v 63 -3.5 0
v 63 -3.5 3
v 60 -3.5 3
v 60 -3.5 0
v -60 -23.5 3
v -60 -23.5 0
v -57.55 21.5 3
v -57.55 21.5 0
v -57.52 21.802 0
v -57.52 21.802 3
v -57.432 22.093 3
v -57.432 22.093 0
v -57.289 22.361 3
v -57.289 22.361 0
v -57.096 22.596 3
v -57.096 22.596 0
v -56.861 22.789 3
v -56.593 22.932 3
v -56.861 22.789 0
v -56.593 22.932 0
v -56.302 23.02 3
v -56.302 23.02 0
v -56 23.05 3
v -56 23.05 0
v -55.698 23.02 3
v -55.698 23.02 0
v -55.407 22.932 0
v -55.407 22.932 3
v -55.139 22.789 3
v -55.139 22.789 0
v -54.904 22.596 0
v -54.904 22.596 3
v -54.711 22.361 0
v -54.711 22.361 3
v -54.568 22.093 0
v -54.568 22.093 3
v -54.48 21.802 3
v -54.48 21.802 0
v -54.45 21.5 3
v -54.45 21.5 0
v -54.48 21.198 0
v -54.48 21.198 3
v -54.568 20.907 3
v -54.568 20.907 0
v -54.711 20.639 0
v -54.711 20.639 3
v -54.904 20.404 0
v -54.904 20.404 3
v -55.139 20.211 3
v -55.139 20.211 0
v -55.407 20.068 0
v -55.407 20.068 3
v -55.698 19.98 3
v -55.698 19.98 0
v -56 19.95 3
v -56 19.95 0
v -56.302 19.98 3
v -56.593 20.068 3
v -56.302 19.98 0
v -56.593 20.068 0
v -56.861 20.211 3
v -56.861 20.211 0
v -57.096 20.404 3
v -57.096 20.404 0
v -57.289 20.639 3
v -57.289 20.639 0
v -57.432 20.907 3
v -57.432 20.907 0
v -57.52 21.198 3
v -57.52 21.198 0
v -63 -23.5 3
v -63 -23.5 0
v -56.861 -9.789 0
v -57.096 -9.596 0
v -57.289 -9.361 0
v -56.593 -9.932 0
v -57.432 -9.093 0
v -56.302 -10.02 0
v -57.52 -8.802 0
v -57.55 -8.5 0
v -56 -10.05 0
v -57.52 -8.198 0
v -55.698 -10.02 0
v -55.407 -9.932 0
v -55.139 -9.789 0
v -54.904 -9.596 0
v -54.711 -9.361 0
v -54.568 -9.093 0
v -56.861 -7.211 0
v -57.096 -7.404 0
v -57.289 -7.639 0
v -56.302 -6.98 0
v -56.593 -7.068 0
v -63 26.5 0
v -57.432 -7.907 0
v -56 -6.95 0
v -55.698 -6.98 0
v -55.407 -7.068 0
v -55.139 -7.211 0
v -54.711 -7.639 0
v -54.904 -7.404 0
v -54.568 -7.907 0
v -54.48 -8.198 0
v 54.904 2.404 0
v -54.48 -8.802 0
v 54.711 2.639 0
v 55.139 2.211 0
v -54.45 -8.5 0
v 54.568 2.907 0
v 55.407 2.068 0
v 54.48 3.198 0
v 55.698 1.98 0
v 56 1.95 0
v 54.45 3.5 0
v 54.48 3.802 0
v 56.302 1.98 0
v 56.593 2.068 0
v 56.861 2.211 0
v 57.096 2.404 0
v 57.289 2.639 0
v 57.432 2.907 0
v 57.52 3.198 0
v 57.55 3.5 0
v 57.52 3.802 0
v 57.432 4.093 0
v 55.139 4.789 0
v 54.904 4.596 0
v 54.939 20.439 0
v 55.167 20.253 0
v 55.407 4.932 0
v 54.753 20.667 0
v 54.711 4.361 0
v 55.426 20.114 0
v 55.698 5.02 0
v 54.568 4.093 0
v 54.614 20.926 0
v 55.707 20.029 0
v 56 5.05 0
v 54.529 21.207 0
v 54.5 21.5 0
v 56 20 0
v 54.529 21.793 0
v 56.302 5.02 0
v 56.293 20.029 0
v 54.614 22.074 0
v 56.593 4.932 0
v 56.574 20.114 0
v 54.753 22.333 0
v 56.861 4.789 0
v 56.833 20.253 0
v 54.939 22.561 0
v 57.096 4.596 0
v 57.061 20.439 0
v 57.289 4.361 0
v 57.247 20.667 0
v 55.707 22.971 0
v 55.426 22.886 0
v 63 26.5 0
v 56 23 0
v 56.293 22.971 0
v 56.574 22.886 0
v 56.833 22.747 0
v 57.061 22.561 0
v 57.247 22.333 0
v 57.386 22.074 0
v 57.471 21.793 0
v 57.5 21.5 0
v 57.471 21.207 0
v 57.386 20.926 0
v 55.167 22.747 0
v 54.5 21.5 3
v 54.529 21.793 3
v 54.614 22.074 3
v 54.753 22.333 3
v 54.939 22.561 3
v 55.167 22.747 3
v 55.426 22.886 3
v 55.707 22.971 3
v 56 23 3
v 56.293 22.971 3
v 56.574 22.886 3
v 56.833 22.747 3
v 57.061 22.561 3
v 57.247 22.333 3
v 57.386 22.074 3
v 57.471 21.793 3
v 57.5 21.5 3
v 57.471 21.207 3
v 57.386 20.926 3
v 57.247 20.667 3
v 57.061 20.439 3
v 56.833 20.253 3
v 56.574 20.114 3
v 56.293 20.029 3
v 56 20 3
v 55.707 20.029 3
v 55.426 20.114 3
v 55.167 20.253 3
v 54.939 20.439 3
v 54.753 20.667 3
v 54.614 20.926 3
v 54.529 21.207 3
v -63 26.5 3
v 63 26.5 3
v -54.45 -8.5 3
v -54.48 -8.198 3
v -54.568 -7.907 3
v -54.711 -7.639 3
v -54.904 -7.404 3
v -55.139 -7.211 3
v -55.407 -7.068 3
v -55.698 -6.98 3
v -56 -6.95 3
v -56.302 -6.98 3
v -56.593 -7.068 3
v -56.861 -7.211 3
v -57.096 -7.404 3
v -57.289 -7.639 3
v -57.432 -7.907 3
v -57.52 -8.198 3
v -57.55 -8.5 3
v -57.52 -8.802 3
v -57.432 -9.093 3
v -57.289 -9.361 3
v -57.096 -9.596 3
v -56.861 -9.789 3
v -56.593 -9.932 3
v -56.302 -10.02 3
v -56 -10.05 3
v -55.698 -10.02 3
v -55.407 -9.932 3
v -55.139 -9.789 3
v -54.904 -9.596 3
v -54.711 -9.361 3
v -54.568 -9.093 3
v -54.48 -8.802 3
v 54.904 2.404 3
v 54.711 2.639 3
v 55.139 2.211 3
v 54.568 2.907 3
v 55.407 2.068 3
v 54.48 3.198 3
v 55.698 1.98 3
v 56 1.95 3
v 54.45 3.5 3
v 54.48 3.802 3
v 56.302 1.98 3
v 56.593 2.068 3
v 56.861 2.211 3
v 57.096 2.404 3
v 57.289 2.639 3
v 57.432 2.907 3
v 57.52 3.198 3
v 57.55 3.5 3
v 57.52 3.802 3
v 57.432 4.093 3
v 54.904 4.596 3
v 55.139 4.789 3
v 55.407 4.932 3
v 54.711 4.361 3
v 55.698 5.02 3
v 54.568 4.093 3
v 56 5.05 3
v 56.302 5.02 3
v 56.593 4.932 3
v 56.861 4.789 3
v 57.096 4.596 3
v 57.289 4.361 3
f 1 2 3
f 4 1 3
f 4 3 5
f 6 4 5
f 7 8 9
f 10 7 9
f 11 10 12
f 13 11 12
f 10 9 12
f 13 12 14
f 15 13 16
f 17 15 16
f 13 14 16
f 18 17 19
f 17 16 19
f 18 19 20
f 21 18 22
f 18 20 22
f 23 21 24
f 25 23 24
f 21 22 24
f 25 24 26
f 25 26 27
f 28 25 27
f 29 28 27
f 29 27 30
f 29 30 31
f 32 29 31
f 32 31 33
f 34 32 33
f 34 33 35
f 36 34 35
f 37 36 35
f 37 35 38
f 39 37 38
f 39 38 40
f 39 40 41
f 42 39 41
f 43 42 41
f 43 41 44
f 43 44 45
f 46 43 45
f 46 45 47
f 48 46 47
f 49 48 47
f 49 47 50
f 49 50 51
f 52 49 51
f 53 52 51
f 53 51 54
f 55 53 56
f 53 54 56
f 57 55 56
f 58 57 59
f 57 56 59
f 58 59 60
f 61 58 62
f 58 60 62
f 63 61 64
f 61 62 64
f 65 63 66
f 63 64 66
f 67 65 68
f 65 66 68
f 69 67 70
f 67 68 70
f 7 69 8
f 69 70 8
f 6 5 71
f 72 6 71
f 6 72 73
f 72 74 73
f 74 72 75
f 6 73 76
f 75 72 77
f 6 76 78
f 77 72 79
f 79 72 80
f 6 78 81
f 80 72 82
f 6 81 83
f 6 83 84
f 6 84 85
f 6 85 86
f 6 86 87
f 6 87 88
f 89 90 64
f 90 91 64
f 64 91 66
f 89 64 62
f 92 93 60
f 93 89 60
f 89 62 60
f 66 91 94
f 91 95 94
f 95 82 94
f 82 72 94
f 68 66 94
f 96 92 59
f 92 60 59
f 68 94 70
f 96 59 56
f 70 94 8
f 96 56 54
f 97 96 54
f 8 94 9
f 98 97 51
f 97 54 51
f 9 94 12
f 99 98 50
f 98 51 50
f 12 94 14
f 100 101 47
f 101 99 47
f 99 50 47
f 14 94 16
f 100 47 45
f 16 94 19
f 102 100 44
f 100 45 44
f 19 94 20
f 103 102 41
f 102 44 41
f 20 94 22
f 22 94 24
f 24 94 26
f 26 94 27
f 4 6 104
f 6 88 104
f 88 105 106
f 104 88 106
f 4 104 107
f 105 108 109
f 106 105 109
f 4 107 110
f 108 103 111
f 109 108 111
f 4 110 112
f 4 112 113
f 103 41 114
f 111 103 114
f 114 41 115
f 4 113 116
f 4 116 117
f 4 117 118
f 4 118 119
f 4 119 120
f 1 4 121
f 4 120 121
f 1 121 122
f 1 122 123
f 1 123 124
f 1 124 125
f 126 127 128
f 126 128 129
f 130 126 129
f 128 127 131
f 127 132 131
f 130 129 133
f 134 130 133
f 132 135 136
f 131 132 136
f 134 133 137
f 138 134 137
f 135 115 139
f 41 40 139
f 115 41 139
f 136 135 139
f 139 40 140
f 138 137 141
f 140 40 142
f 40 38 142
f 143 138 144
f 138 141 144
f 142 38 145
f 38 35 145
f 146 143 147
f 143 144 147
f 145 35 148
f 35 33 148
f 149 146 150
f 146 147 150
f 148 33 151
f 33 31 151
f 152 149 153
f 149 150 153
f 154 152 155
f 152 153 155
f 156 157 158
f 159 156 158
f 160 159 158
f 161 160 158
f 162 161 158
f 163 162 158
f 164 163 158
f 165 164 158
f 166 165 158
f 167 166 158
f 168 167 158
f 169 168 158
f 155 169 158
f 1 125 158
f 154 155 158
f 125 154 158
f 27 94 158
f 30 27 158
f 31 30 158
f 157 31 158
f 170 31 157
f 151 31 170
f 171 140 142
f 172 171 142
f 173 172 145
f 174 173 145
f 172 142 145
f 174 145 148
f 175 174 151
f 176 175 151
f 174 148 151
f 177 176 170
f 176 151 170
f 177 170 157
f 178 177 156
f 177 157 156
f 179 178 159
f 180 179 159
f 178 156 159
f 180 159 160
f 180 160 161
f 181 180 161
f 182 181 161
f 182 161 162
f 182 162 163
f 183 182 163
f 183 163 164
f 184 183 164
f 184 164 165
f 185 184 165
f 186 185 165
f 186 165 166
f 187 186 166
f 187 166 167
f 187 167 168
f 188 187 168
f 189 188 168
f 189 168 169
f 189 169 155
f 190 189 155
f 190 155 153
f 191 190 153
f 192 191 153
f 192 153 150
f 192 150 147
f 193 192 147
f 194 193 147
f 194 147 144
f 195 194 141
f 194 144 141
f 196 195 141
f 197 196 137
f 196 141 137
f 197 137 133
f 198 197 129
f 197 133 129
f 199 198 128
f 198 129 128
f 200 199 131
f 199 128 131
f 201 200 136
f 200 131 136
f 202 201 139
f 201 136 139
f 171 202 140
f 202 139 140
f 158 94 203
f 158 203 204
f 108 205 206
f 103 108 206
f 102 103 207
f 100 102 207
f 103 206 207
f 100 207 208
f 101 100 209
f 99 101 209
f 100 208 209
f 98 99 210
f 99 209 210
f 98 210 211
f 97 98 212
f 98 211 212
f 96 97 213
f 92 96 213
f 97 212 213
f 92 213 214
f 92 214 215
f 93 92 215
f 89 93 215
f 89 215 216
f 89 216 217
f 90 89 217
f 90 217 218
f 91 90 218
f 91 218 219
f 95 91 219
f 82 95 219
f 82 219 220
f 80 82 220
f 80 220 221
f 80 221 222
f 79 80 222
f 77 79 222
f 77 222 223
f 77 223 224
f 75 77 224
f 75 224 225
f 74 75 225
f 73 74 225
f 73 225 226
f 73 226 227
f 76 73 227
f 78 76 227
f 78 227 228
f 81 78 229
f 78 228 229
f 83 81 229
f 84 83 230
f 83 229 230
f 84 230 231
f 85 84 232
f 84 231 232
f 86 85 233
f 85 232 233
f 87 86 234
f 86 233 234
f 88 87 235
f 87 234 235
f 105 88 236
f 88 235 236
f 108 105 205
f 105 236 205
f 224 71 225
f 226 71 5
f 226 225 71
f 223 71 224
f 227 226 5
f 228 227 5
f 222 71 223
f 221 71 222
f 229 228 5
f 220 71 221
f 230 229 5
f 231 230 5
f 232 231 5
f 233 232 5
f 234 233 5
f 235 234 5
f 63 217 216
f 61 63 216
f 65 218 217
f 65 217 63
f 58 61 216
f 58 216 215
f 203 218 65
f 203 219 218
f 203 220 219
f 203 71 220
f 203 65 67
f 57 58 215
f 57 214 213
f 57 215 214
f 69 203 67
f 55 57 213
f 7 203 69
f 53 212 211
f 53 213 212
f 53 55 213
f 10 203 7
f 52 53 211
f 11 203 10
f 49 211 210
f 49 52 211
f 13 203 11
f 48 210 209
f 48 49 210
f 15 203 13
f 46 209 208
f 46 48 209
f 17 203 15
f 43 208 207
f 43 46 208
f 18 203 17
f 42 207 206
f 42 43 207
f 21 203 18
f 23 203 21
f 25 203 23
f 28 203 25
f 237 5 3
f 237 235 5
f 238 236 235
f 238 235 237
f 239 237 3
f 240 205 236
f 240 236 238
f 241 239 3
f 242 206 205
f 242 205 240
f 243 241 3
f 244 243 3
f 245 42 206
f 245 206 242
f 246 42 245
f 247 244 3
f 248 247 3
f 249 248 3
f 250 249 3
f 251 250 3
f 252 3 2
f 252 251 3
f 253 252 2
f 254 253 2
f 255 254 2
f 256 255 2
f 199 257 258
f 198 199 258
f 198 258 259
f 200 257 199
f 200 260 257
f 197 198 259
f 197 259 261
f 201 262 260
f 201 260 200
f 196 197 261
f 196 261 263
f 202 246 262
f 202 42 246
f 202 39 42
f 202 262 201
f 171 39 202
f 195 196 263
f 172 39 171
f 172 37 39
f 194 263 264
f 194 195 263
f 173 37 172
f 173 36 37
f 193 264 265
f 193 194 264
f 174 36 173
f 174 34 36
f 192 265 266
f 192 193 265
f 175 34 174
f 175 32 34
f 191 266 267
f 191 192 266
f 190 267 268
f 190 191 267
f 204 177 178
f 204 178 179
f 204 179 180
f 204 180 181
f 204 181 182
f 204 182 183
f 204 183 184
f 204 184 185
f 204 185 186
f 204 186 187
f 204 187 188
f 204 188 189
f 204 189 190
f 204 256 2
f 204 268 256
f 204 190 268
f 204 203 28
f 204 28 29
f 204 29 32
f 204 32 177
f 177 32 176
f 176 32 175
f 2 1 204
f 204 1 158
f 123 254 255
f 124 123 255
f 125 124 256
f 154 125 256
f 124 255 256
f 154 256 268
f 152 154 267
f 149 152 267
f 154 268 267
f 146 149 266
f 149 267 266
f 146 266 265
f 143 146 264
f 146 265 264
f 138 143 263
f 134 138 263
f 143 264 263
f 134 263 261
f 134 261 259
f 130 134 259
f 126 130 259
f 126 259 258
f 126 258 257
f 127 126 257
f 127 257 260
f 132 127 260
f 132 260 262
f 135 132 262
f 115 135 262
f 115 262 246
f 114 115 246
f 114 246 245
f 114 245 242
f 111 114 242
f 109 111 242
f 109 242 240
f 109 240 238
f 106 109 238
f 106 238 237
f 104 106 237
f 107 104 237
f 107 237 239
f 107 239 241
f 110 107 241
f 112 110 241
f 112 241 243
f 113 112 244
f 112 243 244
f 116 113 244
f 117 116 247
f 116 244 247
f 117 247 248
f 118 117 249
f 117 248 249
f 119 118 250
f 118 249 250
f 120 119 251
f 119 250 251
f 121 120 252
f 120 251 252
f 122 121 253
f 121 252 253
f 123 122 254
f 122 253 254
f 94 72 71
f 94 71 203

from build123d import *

# Parameters (mm, degrees)
SKETCH_1_W          = 126
SKETCH_1_H          = 53
EXTRUDE_1_DEPTH     = 3
SKETCH_2_R          = 1.55
SKETCH_2_R_2        = 1.5
CUT_EXTRUDE_1_DEPTH = 10
SKETCH_3_R          = 1.55
CUT_EXTRUDE_2_DEPTH = 10
SKETCH_5_R          = 1.55
CUT_EXTRUDE_5_DEPTH = 10
CUT_EXTRUDE_7_DEPTH = 69.412352686


with BuildPart() as part:
    # 草图1 → 凸台-拉伸1 (new body)
    with BuildSketch(Plane.XY):
        Rectangle(SKETCH_1_W, SKETCH_1_H)
    extrude(amount=EXTRUDE_1_DEPTH)

    # 草图2 → 切除-拉伸1 (cut)
    with BuildSketch(Plane(origin=(0, 0, 0), x_dir=(-1, 0, 0), z_dir=(0, 0, -1))):
        with Locations((56, 21.5)):
            Circle(SKETCH_2_R)
        with Locations((-56, 21.5)):
            Circle(SKETCH_2_R_2)
    extrude(amount=-CUT_EXTRUDE_1_DEPTH, mode=Mode.SUBTRACT)

    # 草图3 → 切除-拉伸2 (cut)
    with BuildSketch(Plane.XY.offset(3)):
        with Locations((-56, -8.5)):
            Circle(SKETCH_3_R)
        with Locations((56, -8.5)):
            Circle(SKETCH_3_R)
    extrude(amount=-CUT_EXTRUDE_2_DEPTH, mode=Mode.SUBTRACT)

    # 草图5 → 切除-拉伸5 (cut)
    with BuildSketch(Plane.XY.offset(3)):
        with Locations((56, 3.5)):
            Circle(SKETCH_5_R)
    extrude(amount=-CUT_EXTRUDE_5_DEPTH, mode=Mode.SUBTRACT)

    # 草图6 → 切除-拉伸7 (cut, through all)
    with BuildSketch(Plane.XY.offset(3)):
        Polygon((62.980435582, -3.5), (60, -3.5), (-60, -23.5), (-63, -23.5), (-63, -26.5), (63, -26.5), (63, -3.5), align=None)
    extrude(amount=-CUT_EXTRUDE_7_DEPTH, mode=Mode.SUBTRACT)


solid = part.part
